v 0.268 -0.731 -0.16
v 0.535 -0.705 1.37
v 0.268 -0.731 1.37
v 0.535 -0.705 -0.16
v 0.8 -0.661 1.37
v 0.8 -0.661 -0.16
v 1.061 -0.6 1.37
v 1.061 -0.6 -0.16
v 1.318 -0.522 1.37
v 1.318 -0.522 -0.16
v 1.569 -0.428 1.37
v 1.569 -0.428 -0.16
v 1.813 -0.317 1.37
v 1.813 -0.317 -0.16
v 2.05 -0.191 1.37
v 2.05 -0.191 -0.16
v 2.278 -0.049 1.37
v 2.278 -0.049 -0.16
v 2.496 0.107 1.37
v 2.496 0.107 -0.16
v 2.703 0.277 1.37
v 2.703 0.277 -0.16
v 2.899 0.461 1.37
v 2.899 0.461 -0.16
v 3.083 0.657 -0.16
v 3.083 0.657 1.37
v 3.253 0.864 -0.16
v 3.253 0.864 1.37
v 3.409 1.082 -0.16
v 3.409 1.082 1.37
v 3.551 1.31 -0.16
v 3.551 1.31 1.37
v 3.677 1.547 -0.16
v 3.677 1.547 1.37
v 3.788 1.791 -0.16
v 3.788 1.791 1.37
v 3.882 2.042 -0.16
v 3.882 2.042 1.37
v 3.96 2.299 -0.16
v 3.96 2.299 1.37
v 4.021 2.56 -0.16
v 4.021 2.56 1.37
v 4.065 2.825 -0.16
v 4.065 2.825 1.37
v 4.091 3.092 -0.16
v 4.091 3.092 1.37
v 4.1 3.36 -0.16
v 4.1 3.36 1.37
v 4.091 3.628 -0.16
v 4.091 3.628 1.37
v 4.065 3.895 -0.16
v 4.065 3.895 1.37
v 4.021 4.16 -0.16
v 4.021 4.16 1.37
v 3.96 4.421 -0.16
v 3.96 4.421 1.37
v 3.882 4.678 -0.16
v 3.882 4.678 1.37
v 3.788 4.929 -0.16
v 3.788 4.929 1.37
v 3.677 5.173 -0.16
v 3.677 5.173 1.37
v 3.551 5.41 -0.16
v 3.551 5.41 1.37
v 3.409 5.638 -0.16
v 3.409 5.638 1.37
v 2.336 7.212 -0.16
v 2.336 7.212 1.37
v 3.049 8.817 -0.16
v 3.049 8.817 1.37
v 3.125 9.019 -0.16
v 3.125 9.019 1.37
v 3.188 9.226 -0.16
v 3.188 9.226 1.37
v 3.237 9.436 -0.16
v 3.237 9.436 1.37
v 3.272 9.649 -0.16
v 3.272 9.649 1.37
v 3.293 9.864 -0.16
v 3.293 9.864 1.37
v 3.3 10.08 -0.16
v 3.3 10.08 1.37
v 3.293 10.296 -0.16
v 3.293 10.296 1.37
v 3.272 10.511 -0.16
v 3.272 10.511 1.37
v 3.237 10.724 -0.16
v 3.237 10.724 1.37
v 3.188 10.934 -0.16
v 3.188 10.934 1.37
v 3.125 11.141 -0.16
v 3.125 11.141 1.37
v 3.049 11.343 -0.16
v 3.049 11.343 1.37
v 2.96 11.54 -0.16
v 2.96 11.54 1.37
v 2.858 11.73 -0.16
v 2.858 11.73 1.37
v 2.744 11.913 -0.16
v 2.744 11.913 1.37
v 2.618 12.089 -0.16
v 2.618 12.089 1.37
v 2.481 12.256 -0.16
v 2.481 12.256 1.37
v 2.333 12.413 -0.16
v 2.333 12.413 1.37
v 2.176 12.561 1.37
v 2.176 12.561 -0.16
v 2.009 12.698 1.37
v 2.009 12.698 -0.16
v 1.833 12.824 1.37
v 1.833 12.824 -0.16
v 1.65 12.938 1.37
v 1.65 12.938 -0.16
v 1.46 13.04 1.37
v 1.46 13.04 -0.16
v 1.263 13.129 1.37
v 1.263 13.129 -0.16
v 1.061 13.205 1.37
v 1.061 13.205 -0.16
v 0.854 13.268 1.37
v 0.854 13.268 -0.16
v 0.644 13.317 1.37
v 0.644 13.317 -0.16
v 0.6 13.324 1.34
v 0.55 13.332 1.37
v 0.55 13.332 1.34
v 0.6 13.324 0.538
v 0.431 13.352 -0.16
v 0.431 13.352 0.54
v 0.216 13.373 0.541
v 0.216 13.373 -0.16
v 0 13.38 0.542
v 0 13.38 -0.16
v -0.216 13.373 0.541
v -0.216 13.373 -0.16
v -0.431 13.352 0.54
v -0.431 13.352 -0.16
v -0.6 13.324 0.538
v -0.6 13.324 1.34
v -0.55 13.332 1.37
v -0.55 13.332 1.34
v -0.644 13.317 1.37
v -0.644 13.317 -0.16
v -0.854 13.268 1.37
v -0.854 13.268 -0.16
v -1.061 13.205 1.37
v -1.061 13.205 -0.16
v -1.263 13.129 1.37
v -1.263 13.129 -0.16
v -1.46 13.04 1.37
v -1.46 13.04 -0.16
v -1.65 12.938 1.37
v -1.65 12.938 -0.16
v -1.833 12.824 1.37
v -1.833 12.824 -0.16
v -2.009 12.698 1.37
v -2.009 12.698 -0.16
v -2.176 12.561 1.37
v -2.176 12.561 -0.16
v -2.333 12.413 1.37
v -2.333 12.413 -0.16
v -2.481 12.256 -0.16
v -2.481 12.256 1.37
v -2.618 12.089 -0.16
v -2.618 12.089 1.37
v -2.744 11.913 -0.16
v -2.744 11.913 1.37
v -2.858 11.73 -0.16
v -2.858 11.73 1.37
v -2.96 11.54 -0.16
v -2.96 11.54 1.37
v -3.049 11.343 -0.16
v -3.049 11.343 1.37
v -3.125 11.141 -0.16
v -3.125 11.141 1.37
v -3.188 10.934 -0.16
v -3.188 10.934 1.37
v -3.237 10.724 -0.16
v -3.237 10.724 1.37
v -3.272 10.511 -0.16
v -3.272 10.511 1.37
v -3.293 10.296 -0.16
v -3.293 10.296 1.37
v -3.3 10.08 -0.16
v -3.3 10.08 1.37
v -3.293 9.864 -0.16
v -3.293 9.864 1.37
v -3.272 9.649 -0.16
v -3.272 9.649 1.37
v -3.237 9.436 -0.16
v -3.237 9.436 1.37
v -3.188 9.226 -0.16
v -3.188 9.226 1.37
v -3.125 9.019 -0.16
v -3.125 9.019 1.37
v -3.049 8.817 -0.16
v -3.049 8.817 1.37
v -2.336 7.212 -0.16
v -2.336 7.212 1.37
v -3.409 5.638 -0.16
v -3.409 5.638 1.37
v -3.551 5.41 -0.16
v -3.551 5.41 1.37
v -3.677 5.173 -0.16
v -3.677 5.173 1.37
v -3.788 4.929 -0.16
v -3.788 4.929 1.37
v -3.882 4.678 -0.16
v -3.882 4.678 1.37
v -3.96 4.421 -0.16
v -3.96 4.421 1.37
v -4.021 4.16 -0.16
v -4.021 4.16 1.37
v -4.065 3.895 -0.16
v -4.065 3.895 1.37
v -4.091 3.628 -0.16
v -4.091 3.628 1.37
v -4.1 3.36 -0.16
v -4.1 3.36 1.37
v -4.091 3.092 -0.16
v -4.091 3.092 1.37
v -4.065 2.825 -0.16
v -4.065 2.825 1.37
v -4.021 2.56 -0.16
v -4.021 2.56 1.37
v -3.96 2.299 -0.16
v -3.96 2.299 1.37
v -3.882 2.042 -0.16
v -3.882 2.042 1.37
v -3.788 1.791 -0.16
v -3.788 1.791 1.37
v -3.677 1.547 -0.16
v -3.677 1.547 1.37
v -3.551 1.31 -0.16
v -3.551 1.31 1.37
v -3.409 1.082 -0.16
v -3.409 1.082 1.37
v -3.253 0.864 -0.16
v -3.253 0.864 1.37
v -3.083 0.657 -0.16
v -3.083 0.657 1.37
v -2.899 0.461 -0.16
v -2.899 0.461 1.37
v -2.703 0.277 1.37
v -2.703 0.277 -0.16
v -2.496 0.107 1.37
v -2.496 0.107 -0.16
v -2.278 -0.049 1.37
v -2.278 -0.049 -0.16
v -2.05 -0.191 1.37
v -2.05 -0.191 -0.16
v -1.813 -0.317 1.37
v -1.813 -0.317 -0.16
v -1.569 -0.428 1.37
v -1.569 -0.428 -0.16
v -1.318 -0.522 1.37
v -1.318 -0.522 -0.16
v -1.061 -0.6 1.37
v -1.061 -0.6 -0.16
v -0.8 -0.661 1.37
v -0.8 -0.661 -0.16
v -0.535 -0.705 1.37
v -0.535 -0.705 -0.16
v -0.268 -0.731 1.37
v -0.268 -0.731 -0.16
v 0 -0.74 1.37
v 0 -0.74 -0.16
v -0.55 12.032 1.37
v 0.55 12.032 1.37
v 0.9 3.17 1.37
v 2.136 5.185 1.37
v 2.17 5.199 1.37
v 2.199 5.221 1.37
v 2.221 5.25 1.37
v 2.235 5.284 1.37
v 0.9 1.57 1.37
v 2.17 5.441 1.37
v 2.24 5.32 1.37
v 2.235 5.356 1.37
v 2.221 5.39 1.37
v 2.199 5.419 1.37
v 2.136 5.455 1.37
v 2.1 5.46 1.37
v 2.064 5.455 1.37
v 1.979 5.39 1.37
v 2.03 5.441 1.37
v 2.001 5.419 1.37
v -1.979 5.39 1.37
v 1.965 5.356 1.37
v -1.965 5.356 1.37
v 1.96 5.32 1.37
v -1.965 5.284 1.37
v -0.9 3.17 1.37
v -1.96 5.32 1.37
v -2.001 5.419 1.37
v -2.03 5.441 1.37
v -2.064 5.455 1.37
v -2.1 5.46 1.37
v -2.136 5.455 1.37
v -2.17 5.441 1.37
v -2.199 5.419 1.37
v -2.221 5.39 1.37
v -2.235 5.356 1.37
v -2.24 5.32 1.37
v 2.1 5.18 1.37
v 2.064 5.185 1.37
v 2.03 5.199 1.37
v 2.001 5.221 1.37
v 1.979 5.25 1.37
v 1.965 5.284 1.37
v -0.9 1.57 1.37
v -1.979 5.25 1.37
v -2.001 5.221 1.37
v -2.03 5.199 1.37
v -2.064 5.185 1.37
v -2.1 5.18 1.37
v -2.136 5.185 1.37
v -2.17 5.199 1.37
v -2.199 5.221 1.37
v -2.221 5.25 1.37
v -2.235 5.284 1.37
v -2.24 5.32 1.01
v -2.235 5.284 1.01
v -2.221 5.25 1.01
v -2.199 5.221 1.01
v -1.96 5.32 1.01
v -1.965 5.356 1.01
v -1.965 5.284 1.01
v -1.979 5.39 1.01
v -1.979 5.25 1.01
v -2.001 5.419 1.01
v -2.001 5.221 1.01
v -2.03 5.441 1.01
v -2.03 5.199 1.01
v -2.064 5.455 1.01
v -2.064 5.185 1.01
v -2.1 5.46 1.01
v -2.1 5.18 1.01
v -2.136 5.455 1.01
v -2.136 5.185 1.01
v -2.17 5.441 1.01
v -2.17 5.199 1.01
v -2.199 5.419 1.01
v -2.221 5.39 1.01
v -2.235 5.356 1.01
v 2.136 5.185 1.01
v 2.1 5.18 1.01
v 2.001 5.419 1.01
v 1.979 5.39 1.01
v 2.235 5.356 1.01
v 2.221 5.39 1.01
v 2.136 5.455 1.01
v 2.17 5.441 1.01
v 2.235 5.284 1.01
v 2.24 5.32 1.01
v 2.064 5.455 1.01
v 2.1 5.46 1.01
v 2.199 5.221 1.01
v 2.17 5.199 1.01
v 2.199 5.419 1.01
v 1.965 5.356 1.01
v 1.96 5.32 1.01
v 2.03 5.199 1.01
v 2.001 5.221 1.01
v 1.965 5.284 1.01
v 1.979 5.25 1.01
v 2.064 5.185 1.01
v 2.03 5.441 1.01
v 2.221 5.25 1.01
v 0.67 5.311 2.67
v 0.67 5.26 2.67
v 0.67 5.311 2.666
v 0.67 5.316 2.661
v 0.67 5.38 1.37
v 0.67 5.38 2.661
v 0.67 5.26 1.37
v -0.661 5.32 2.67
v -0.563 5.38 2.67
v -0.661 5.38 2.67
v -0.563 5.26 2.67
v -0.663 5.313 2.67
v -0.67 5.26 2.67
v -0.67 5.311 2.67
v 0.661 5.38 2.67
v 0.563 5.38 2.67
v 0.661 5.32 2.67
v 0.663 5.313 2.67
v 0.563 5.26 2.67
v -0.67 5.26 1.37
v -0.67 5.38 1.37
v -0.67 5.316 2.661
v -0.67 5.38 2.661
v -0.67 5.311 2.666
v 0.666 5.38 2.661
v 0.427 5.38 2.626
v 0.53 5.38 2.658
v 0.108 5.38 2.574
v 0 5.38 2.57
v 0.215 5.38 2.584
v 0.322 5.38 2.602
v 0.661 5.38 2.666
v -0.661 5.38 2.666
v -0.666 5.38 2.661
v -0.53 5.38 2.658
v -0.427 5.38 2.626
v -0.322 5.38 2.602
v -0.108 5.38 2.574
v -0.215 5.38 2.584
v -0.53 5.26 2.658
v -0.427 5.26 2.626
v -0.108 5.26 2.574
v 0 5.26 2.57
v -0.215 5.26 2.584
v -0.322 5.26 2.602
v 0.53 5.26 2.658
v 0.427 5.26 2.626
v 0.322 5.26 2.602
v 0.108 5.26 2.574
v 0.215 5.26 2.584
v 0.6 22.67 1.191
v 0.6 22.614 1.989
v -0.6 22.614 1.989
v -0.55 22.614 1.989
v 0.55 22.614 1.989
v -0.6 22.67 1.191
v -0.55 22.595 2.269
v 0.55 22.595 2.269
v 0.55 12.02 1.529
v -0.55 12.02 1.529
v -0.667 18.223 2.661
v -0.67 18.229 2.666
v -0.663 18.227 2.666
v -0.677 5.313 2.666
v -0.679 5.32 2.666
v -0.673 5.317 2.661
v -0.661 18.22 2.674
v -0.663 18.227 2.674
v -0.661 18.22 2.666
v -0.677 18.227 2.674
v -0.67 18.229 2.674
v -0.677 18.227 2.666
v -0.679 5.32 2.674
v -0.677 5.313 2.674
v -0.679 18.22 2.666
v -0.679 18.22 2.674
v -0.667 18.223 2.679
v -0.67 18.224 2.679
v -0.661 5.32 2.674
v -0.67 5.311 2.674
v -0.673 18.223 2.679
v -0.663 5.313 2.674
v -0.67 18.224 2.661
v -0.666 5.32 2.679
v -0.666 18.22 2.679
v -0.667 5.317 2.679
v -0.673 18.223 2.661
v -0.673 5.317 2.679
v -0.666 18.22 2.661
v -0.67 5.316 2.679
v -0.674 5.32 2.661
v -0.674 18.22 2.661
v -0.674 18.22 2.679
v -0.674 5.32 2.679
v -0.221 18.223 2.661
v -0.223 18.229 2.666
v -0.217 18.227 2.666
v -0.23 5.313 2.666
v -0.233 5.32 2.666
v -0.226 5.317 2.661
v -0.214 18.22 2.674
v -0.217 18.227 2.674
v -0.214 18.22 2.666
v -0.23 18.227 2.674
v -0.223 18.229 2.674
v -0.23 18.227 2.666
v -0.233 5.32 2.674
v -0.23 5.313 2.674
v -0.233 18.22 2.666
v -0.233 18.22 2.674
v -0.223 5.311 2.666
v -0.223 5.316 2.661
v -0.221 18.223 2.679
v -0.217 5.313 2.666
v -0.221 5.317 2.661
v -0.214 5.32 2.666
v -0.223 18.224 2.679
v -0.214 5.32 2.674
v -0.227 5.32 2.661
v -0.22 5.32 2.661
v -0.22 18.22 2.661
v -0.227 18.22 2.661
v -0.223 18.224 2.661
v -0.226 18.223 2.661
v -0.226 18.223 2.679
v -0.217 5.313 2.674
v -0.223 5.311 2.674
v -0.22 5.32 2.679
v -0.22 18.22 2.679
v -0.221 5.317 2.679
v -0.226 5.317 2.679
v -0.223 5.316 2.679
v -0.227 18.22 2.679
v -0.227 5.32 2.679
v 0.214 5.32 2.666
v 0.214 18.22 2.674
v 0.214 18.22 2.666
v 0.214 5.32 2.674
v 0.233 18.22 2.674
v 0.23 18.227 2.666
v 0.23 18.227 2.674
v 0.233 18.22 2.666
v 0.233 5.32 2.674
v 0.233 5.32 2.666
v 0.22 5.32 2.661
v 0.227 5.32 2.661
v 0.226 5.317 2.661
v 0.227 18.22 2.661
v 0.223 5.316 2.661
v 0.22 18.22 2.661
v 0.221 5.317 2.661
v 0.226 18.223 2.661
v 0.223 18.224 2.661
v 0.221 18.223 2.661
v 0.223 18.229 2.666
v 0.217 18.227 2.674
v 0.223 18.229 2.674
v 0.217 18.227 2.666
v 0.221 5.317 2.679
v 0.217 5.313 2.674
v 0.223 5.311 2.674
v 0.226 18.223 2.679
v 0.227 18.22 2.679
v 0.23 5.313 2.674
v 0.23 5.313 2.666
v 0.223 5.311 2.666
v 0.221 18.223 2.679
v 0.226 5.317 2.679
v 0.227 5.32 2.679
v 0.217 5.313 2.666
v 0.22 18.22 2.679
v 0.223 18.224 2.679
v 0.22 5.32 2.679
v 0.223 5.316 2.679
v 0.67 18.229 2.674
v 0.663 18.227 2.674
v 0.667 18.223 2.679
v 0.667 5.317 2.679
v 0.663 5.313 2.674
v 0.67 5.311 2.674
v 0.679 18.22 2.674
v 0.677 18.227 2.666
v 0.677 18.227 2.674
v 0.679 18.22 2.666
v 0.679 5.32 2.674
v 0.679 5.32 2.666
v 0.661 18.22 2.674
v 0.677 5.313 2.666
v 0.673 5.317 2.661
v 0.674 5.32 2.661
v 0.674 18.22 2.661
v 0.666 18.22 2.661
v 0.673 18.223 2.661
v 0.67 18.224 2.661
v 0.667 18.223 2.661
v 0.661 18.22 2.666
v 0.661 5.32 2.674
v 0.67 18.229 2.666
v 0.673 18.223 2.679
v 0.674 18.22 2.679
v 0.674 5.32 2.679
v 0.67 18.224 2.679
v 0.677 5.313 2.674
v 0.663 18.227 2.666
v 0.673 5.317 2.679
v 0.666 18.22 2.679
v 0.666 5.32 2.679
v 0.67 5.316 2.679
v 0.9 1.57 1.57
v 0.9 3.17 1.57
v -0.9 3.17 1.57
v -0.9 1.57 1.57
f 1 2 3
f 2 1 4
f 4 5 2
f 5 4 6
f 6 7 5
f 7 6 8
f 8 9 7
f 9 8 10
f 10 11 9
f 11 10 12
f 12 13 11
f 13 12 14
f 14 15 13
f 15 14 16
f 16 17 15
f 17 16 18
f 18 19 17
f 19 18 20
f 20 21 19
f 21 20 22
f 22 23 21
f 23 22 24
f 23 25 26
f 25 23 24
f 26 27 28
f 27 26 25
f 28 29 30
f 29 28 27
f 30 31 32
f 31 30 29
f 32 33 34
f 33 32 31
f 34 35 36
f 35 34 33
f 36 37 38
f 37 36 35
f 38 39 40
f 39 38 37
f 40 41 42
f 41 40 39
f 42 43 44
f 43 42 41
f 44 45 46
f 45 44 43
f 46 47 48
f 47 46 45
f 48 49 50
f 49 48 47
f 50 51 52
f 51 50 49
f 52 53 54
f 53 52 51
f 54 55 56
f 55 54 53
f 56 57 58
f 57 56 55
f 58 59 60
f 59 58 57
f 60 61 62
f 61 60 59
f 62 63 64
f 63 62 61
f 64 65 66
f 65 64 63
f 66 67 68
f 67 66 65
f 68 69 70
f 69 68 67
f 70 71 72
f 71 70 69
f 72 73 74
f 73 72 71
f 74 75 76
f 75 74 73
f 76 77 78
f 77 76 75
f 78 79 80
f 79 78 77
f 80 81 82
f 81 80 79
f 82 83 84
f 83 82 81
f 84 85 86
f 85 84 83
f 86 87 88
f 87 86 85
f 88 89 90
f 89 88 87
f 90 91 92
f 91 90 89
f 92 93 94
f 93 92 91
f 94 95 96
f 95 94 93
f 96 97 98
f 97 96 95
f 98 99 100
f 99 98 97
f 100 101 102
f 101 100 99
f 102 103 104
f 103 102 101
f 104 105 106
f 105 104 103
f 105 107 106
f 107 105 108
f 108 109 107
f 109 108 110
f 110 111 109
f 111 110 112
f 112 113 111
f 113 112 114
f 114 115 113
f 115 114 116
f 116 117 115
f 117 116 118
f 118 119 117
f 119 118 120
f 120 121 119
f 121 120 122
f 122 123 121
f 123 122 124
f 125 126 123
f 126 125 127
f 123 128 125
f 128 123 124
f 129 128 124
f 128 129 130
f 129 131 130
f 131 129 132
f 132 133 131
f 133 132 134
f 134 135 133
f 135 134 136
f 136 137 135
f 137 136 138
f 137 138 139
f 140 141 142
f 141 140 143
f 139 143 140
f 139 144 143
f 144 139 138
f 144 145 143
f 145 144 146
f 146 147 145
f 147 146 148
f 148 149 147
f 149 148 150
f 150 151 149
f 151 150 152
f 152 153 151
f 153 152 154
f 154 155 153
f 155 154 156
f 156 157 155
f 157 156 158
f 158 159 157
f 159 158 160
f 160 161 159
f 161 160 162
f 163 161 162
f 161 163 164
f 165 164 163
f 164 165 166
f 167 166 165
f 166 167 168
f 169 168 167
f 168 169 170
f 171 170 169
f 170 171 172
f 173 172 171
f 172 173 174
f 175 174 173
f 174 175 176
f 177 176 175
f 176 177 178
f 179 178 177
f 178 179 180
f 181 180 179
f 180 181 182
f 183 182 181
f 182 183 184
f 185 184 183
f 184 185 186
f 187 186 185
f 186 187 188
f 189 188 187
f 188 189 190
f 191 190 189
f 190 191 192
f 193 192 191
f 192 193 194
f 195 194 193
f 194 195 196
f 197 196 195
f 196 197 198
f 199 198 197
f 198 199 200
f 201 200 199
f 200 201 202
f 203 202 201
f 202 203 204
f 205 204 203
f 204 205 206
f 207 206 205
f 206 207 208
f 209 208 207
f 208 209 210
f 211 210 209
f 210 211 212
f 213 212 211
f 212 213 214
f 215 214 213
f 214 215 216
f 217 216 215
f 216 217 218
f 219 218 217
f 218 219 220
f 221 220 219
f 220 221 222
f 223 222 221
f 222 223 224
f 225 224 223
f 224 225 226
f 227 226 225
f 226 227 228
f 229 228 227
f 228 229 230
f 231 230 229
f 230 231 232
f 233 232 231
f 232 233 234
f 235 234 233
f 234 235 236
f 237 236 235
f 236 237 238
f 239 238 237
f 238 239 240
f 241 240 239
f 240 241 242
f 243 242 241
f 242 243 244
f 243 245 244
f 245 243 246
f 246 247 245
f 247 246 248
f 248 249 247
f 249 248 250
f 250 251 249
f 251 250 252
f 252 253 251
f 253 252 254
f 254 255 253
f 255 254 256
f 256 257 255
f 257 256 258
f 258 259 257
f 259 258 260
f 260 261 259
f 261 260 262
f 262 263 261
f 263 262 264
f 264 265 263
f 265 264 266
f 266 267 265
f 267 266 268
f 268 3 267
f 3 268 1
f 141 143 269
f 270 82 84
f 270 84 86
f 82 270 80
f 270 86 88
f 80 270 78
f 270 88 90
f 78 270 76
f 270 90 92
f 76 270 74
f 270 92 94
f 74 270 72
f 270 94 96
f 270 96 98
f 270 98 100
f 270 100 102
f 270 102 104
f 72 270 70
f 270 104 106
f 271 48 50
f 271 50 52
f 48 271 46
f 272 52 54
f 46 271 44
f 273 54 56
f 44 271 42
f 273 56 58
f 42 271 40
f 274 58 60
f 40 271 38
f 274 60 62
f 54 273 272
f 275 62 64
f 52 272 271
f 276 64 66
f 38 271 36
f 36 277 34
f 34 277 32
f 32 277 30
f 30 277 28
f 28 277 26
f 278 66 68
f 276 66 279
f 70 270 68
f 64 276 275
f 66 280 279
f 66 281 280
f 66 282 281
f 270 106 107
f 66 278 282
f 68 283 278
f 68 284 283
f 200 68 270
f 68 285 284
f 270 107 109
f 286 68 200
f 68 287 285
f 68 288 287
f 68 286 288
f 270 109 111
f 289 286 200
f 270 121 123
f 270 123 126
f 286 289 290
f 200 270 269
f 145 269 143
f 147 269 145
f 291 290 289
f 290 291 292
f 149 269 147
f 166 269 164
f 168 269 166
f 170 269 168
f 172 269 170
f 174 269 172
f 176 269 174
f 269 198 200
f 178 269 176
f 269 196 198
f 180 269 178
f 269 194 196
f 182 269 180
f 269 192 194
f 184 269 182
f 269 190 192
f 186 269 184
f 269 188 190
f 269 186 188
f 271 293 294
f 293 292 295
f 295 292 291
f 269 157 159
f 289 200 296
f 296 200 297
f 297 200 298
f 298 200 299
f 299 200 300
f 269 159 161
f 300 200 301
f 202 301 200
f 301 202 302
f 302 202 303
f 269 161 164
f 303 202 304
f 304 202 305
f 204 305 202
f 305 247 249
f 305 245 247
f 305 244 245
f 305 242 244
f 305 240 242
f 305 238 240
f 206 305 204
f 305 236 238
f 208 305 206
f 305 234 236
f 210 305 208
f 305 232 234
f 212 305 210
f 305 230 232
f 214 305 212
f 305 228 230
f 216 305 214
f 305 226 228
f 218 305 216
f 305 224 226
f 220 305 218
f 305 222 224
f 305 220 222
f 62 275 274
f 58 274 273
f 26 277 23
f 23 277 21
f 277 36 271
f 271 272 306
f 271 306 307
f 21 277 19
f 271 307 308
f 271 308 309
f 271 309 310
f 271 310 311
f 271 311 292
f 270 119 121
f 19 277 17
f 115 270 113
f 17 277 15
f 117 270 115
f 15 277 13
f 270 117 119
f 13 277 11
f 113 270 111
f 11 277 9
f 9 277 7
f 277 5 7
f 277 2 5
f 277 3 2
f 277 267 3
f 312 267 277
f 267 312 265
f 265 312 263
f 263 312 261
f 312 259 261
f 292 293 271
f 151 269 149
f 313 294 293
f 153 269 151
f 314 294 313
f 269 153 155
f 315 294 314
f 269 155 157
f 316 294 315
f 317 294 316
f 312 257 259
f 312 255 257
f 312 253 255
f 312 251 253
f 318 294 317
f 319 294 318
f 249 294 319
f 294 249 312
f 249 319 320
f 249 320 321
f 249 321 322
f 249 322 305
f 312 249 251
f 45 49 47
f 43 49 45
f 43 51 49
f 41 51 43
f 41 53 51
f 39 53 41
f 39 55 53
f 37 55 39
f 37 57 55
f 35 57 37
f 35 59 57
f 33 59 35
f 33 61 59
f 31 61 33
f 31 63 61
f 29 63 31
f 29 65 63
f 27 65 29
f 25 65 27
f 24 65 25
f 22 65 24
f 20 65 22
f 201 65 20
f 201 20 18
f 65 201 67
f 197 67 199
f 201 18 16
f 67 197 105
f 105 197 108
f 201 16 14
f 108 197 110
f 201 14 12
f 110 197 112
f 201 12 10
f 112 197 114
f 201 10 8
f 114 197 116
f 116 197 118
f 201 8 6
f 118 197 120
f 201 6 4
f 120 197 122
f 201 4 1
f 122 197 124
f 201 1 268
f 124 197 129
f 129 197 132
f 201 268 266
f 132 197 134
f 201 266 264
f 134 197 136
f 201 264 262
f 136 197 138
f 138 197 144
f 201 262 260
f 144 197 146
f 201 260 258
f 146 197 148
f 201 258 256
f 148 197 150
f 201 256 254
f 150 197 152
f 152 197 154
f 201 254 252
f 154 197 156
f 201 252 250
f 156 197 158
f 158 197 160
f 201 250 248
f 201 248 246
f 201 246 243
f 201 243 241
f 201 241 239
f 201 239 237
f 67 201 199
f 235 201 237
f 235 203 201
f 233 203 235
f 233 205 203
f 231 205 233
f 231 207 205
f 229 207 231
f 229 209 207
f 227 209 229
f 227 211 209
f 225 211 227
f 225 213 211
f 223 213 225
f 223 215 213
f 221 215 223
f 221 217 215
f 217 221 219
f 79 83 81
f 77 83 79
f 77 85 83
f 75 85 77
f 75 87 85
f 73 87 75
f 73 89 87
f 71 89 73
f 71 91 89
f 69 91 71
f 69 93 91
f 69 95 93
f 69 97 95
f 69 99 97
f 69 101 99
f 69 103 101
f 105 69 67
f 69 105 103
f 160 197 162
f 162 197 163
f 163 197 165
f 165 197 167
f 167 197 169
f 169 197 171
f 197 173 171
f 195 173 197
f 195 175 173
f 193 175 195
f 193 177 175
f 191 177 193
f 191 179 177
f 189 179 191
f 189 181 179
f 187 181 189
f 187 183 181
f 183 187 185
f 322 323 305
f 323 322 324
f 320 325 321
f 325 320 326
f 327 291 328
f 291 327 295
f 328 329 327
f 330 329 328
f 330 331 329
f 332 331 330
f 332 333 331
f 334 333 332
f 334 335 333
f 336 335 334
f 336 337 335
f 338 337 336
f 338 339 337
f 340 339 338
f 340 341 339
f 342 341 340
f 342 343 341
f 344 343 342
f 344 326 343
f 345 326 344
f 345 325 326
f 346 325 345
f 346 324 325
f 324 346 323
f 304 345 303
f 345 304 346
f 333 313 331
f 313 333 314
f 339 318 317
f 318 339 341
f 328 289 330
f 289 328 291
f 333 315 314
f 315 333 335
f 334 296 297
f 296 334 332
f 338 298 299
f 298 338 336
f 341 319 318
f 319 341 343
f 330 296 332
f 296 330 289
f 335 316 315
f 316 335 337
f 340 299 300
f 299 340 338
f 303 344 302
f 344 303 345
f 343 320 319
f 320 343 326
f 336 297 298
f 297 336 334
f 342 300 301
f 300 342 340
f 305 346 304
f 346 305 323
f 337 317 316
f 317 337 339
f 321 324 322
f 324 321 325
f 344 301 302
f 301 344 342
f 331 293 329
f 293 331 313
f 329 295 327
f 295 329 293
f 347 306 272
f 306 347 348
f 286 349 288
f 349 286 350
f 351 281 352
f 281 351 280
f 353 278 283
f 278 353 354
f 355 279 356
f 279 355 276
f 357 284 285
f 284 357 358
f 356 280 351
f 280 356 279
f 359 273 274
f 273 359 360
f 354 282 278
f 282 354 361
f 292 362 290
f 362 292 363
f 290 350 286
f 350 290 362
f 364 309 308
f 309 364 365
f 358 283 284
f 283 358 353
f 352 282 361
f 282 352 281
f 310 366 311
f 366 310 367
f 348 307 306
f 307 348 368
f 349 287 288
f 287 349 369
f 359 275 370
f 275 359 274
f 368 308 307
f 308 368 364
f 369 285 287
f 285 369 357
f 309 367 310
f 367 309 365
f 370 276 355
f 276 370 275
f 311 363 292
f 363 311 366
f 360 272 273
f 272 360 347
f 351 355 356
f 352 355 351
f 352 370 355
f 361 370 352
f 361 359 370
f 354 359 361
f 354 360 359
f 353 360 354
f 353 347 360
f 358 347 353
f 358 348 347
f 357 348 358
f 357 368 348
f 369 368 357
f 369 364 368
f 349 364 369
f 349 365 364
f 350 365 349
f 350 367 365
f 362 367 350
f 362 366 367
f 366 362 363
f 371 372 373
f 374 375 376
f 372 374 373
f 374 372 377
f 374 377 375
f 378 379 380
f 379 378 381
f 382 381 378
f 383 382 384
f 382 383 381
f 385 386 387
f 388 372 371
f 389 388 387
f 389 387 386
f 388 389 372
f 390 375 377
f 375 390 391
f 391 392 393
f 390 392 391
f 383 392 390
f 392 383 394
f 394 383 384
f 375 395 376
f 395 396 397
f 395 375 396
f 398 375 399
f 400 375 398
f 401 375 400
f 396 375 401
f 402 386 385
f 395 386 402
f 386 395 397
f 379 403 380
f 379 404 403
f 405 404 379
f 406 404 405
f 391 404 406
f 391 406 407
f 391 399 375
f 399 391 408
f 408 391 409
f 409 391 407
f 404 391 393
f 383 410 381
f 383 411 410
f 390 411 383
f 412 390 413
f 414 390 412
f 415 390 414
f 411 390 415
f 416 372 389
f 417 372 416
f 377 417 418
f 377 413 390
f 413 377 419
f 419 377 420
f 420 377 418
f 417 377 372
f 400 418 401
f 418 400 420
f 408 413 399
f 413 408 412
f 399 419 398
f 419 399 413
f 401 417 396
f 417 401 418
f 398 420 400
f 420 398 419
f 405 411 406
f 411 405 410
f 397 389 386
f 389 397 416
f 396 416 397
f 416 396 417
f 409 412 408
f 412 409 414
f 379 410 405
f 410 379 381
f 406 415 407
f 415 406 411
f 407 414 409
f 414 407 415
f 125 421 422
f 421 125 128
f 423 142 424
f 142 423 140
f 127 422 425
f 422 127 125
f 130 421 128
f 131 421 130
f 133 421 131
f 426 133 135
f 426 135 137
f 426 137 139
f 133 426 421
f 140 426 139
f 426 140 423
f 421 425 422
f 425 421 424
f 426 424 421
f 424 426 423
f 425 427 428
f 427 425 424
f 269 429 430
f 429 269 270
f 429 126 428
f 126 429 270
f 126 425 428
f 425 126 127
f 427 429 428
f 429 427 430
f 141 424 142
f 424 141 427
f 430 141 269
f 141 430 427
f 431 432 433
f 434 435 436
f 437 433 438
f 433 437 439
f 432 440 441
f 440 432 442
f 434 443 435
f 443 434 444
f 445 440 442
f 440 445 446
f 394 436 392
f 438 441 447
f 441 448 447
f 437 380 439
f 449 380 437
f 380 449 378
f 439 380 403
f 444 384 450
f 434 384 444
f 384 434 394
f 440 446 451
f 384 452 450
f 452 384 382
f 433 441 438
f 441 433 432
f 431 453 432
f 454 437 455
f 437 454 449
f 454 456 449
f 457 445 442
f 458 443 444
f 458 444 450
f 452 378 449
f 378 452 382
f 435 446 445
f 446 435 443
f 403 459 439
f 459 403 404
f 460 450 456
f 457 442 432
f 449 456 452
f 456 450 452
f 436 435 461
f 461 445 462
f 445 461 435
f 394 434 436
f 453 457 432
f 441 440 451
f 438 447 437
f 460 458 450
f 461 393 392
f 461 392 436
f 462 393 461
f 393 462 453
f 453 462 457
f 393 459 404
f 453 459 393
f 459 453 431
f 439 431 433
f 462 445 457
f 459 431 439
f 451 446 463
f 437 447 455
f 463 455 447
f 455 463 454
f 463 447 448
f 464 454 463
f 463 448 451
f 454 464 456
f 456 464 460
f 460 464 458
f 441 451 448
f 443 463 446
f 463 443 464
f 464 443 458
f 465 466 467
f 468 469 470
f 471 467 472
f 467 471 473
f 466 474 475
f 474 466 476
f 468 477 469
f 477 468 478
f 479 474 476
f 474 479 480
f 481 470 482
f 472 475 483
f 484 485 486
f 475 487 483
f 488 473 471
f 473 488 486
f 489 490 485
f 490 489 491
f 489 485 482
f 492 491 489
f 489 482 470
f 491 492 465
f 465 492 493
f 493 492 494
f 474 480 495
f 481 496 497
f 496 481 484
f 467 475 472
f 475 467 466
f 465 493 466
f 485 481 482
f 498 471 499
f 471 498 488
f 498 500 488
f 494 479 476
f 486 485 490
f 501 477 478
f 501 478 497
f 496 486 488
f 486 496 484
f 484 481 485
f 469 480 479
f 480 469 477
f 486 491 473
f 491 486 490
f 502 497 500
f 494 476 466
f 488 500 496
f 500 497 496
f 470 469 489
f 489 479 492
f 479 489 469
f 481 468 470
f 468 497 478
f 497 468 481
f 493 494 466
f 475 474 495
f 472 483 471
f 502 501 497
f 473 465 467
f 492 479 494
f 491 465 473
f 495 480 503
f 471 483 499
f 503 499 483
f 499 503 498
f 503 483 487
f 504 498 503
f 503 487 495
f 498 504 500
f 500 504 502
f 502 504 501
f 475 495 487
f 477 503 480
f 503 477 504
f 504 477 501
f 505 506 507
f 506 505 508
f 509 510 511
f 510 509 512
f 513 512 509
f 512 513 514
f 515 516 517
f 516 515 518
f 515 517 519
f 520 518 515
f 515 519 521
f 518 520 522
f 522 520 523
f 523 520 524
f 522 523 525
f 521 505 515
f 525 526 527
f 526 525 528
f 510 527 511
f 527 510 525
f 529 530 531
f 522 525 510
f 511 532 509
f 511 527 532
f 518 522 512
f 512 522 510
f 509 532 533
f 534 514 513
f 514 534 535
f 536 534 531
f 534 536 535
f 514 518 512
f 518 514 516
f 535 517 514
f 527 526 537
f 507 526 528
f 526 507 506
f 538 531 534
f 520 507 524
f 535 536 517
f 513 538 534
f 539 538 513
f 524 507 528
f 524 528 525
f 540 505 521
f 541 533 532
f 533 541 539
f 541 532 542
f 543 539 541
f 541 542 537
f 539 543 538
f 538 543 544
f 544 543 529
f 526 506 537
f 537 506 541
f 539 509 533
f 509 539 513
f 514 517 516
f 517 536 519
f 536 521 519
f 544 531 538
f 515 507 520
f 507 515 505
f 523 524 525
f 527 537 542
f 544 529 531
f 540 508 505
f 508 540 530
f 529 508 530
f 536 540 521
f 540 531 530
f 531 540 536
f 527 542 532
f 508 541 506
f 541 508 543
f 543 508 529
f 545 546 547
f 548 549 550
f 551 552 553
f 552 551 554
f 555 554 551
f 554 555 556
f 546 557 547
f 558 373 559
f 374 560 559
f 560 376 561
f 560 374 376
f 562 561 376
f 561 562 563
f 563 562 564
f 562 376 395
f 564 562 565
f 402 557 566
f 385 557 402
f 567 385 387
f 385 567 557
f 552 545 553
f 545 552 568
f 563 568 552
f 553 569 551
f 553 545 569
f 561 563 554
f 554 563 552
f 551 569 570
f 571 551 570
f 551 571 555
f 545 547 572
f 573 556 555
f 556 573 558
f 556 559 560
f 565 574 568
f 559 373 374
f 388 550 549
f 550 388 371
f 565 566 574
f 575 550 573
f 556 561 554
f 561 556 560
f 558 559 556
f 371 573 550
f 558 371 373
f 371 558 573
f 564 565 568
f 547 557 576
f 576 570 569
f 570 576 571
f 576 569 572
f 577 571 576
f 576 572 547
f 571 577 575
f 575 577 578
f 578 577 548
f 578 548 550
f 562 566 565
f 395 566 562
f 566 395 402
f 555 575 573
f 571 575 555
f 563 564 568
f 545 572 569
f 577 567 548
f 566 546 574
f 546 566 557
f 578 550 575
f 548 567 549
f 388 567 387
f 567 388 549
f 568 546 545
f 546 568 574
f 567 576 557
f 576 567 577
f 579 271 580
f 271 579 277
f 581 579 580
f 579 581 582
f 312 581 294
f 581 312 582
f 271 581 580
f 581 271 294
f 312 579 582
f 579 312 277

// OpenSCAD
// Acoustic violin parametric master — bowed-string reference envelope.
//
// Authority: pending_measurement. NOT fabrication authority until reviewed
// against a measured template / luthier reference (see
// visual-output-register.csv CAD-001, validation.csv, and design.md gaps).
//
// Dimension sources (do not edit values without updating the source record):
//   - scale length, body length, bouts, rib height, plate thicknesses,
//     f-hole spacing, neck angle: family-spec.csv (acoustic-violin-baseline row),
//     itself derived from acoustic-violin-design-table.xlsx.
//   - tuning G3-D4-A4-E5, ~45-55 lbf total tension: design.md "Baseline
//     Assumptions".
//   - open-string model f = (1/2L)*sqrt(T/mu): design.md "Governing Model".
//
// BOWED-STRING geometry that is FUNCTION-CRITICAL but NOT in this repo's design
// table is modeled generically and flagged `TBD_measurement`. These parameters
// (bridge crown radius, afterlength, string spacing at bridge, fingerboard
// scoop, neck projection) MUST come from a measured setup drawing before this
// master can carry fabrication authority — see README "Build Review Checklist".
//
// Units: inches.

/* [Member — family-spec.csv] */
// 0 = acoustic-violin-baseline, 1 = acoustic-violin-variant
member = 0;

// family-spec.csv columns, per member row.
scale_lengths_in  = [12.9, 13.9];   // vibrating string length (nut->bridge)
body_lengths_in   = [14.0, 15.1];
upper_bouts_in    = [6.6, 7.13];
lower_bouts_in    = [8.2, 8.86];
rib_heights_in    = [1.25, 1.35];
top_thicks_in     = [0.12, 0.12];
back_thicks_in    = [0.16, 0.16];
f_hole_spacing_in = [4.2, 4.54];
neck_angles_deg   = [4.0, 4.32];

scale_length_in   = scale_lengths_in[member];
body_length_in    = body_lengths_in[member];
upper_bout_in     = upper_bouts_in[member];
lower_bout_in     = lower_bouts_in[member];
rib_height_in     = rib_heights_in[member];
top_thickness_in  = top_thicks_in[member];
back_thickness_in = back_thicks_in[member];
f_hole_gap_in     = f_hole_spacing_in[member];
neck_angle_deg    = neck_angles_deg[member];

/* [Strings — design.md] */
string_count      = 4;      // G3-D4-A4-E5 (design.md tuning)

/* [Bowed setup — TBD_measurement: NOT in design table] */
// Standard violin working ranges shown only as modeling placeholders; every
// value here is a measurement gate, not a design-table dimension.
waist_width_in       = 4.1;    // TBD_measurement (C-bout minimum width)
bridge_crown_r_in    = 1.65;   // TBD_measurement (bridge top arc radius)
bridge_height_in     = 1.30;   // TBD_measurement (set by neck projection)
string_spacing_br_in = 1.34;   // TBD_measurement (E->G span at bridge)
afterlength_in       = scale_length_in / 6;  // TBD_measurement (bridge->tailpiece)
fingerboard_len_in   = 10.6;   // TBD_measurement
fingerboard_thick_in = 0.28;   // TBD_measurement
neck_thick_in        = 0.80;   // TBD_measurement

// ---------------------------------------------------------------------------
// Derived geometry (formulas, not baked values)
// ---------------------------------------------------------------------------

// Body centerline runs along +y; bridge sits at the lower-bout acoustic center.
bridge_y_in   = body_length_in * 0.38;   // TBD_measurement (stop-length driven)
nut_y_in      = bridge_y_in + scale_length_in;   // nut = bridge + vibrating len
tailpiece_y   = bridge_y_in - afterlength_in;

// Violin outline: upper bout, C-bout waist, lower bout via a hull of three
// circle pairs. Cosmetic curve only; not a fabrication outline.
module body_outline() {
  hull() {
    translate([0, body_length_in * 0.72, 0]) circle(d = upper_bout_in, $fn = 96);
    translate([0, body_length_in * 0.50, 0]) circle(d = waist_width_in, $fn = 96);
  }
  hull() {
    translate([0, body_length_in * 0.50, 0]) circle(d = waist_width_in, $fn = 96);
    translate([0, body_length_in * 0.24, 0]) circle(d = lower_bout_in, $fn = 96);
  }
}

module body_shell() {
  // Ribs as an extruded outline; top/back are thin plates capping it.
  linear_extrude(height = rib_height_in) body_outline();
  color("bisque") translate([0, 0, rib_height_in])
    linear_extrude(height = top_thickness_in) body_outline();
  color("tan") translate([0, 0, -back_thickness_in])
    linear_extrude(height = back_thickness_in) body_outline();
}

module f_holes() {
  // Two f-hole placeholders flanking the centerline at +/- half the spacing.
  for (s = [-1, 1])
    translate([s * f_hole_gap_in / 2, bridge_y_in, rib_height_in])
      cylinder(h = top_thickness_in * 4, d = 0.28, center = true, $fn = 24);
}

module bridge() {
  // Blank width from string span; crown is a shallow arc (TBD_measurement).
  translate([0, bridge_y_in, rib_height_in + top_thickness_in])
    difference() {
      translate([-string_spacing_br_in / 2, -0.06, 0])
        cube([string_spacing_br_in, 0.12, bridge_height_in]);
      // Crown radius cut across the top edge.
      translate([0, 0, bridge_height_in + bridge_crown_r_in - 0.10])
        rotate([90, 0, 0])
          cylinder(h = 0.4, r = bridge_crown_r_in, center = true, $fn = 96);
    }
}

module tailpiece() {
  translate([-0.9, tailpiece_y - 1.6, rib_height_in + top_thickness_in])
    cube([1.8, 1.6, 0.20]);
}

module neck_and_fingerboard() {
  // Neck root at the upper-bout body joint, tilted by neck_angle_deg so the
  // fingerboard clears the top toward the bridge (projection = TBD_measurement).
  joint_y = body_length_in * 0.86;
  translate([0, joint_y, rib_height_in])
    rotate([neck_angle_deg, 0, 0]) {
      // Neck blank.
      color("burlywood") translate([-0.6, 0, -neck_thick_in])
        cube([1.2, fingerboard_len_in, neck_thick_in]);
      // Fingerboard on top of the neck.
      color("dimgray") translate([-0.55, 0, 0])
        cube([1.1, fingerboard_len_in, fingerboard_thick_in]);
    }
}

module string_paths() {
  // Straight open-string paths, nut -> bridge, spaced across the bridge span.
  for (i = [0 : string_count - 1]) {
    x = -string_spacing_br_in / 2
        + (string_count > 1 ? i * string_spacing_br_in / (string_count - 1) : 0);
    z_bridge = rig_top() + bridge_height_in;
    hull() {
      translate([x, bridge_y_in, z_bridge]) sphere(r = 0.01, $fn = 8);
      translate([x, nut_y_in, z_bridge]) sphere(r = 0.01, $fn = 8);
    }
  }
}

function rig_top() = rib_height_in + top_thickness_in;

module acoustic_violin_assembly() {
  difference() { body_shell(); f_holes(); }
  bridge();
  tailpiece();
  neck_and_fingerboard();
  string_paths();
}

acoustic_violin_assembly();

// Echo the open-string setup so `openscad` runs double as a geometry check.
echo(str("member=", member, " scale_length_in=", scale_length_in));
echo(str("stop_bridge_y_in=", bridge_y_in, " nut_y_in=", nut_y_in));
echo(str("afterlength_in(TBD)=", afterlength_in));
